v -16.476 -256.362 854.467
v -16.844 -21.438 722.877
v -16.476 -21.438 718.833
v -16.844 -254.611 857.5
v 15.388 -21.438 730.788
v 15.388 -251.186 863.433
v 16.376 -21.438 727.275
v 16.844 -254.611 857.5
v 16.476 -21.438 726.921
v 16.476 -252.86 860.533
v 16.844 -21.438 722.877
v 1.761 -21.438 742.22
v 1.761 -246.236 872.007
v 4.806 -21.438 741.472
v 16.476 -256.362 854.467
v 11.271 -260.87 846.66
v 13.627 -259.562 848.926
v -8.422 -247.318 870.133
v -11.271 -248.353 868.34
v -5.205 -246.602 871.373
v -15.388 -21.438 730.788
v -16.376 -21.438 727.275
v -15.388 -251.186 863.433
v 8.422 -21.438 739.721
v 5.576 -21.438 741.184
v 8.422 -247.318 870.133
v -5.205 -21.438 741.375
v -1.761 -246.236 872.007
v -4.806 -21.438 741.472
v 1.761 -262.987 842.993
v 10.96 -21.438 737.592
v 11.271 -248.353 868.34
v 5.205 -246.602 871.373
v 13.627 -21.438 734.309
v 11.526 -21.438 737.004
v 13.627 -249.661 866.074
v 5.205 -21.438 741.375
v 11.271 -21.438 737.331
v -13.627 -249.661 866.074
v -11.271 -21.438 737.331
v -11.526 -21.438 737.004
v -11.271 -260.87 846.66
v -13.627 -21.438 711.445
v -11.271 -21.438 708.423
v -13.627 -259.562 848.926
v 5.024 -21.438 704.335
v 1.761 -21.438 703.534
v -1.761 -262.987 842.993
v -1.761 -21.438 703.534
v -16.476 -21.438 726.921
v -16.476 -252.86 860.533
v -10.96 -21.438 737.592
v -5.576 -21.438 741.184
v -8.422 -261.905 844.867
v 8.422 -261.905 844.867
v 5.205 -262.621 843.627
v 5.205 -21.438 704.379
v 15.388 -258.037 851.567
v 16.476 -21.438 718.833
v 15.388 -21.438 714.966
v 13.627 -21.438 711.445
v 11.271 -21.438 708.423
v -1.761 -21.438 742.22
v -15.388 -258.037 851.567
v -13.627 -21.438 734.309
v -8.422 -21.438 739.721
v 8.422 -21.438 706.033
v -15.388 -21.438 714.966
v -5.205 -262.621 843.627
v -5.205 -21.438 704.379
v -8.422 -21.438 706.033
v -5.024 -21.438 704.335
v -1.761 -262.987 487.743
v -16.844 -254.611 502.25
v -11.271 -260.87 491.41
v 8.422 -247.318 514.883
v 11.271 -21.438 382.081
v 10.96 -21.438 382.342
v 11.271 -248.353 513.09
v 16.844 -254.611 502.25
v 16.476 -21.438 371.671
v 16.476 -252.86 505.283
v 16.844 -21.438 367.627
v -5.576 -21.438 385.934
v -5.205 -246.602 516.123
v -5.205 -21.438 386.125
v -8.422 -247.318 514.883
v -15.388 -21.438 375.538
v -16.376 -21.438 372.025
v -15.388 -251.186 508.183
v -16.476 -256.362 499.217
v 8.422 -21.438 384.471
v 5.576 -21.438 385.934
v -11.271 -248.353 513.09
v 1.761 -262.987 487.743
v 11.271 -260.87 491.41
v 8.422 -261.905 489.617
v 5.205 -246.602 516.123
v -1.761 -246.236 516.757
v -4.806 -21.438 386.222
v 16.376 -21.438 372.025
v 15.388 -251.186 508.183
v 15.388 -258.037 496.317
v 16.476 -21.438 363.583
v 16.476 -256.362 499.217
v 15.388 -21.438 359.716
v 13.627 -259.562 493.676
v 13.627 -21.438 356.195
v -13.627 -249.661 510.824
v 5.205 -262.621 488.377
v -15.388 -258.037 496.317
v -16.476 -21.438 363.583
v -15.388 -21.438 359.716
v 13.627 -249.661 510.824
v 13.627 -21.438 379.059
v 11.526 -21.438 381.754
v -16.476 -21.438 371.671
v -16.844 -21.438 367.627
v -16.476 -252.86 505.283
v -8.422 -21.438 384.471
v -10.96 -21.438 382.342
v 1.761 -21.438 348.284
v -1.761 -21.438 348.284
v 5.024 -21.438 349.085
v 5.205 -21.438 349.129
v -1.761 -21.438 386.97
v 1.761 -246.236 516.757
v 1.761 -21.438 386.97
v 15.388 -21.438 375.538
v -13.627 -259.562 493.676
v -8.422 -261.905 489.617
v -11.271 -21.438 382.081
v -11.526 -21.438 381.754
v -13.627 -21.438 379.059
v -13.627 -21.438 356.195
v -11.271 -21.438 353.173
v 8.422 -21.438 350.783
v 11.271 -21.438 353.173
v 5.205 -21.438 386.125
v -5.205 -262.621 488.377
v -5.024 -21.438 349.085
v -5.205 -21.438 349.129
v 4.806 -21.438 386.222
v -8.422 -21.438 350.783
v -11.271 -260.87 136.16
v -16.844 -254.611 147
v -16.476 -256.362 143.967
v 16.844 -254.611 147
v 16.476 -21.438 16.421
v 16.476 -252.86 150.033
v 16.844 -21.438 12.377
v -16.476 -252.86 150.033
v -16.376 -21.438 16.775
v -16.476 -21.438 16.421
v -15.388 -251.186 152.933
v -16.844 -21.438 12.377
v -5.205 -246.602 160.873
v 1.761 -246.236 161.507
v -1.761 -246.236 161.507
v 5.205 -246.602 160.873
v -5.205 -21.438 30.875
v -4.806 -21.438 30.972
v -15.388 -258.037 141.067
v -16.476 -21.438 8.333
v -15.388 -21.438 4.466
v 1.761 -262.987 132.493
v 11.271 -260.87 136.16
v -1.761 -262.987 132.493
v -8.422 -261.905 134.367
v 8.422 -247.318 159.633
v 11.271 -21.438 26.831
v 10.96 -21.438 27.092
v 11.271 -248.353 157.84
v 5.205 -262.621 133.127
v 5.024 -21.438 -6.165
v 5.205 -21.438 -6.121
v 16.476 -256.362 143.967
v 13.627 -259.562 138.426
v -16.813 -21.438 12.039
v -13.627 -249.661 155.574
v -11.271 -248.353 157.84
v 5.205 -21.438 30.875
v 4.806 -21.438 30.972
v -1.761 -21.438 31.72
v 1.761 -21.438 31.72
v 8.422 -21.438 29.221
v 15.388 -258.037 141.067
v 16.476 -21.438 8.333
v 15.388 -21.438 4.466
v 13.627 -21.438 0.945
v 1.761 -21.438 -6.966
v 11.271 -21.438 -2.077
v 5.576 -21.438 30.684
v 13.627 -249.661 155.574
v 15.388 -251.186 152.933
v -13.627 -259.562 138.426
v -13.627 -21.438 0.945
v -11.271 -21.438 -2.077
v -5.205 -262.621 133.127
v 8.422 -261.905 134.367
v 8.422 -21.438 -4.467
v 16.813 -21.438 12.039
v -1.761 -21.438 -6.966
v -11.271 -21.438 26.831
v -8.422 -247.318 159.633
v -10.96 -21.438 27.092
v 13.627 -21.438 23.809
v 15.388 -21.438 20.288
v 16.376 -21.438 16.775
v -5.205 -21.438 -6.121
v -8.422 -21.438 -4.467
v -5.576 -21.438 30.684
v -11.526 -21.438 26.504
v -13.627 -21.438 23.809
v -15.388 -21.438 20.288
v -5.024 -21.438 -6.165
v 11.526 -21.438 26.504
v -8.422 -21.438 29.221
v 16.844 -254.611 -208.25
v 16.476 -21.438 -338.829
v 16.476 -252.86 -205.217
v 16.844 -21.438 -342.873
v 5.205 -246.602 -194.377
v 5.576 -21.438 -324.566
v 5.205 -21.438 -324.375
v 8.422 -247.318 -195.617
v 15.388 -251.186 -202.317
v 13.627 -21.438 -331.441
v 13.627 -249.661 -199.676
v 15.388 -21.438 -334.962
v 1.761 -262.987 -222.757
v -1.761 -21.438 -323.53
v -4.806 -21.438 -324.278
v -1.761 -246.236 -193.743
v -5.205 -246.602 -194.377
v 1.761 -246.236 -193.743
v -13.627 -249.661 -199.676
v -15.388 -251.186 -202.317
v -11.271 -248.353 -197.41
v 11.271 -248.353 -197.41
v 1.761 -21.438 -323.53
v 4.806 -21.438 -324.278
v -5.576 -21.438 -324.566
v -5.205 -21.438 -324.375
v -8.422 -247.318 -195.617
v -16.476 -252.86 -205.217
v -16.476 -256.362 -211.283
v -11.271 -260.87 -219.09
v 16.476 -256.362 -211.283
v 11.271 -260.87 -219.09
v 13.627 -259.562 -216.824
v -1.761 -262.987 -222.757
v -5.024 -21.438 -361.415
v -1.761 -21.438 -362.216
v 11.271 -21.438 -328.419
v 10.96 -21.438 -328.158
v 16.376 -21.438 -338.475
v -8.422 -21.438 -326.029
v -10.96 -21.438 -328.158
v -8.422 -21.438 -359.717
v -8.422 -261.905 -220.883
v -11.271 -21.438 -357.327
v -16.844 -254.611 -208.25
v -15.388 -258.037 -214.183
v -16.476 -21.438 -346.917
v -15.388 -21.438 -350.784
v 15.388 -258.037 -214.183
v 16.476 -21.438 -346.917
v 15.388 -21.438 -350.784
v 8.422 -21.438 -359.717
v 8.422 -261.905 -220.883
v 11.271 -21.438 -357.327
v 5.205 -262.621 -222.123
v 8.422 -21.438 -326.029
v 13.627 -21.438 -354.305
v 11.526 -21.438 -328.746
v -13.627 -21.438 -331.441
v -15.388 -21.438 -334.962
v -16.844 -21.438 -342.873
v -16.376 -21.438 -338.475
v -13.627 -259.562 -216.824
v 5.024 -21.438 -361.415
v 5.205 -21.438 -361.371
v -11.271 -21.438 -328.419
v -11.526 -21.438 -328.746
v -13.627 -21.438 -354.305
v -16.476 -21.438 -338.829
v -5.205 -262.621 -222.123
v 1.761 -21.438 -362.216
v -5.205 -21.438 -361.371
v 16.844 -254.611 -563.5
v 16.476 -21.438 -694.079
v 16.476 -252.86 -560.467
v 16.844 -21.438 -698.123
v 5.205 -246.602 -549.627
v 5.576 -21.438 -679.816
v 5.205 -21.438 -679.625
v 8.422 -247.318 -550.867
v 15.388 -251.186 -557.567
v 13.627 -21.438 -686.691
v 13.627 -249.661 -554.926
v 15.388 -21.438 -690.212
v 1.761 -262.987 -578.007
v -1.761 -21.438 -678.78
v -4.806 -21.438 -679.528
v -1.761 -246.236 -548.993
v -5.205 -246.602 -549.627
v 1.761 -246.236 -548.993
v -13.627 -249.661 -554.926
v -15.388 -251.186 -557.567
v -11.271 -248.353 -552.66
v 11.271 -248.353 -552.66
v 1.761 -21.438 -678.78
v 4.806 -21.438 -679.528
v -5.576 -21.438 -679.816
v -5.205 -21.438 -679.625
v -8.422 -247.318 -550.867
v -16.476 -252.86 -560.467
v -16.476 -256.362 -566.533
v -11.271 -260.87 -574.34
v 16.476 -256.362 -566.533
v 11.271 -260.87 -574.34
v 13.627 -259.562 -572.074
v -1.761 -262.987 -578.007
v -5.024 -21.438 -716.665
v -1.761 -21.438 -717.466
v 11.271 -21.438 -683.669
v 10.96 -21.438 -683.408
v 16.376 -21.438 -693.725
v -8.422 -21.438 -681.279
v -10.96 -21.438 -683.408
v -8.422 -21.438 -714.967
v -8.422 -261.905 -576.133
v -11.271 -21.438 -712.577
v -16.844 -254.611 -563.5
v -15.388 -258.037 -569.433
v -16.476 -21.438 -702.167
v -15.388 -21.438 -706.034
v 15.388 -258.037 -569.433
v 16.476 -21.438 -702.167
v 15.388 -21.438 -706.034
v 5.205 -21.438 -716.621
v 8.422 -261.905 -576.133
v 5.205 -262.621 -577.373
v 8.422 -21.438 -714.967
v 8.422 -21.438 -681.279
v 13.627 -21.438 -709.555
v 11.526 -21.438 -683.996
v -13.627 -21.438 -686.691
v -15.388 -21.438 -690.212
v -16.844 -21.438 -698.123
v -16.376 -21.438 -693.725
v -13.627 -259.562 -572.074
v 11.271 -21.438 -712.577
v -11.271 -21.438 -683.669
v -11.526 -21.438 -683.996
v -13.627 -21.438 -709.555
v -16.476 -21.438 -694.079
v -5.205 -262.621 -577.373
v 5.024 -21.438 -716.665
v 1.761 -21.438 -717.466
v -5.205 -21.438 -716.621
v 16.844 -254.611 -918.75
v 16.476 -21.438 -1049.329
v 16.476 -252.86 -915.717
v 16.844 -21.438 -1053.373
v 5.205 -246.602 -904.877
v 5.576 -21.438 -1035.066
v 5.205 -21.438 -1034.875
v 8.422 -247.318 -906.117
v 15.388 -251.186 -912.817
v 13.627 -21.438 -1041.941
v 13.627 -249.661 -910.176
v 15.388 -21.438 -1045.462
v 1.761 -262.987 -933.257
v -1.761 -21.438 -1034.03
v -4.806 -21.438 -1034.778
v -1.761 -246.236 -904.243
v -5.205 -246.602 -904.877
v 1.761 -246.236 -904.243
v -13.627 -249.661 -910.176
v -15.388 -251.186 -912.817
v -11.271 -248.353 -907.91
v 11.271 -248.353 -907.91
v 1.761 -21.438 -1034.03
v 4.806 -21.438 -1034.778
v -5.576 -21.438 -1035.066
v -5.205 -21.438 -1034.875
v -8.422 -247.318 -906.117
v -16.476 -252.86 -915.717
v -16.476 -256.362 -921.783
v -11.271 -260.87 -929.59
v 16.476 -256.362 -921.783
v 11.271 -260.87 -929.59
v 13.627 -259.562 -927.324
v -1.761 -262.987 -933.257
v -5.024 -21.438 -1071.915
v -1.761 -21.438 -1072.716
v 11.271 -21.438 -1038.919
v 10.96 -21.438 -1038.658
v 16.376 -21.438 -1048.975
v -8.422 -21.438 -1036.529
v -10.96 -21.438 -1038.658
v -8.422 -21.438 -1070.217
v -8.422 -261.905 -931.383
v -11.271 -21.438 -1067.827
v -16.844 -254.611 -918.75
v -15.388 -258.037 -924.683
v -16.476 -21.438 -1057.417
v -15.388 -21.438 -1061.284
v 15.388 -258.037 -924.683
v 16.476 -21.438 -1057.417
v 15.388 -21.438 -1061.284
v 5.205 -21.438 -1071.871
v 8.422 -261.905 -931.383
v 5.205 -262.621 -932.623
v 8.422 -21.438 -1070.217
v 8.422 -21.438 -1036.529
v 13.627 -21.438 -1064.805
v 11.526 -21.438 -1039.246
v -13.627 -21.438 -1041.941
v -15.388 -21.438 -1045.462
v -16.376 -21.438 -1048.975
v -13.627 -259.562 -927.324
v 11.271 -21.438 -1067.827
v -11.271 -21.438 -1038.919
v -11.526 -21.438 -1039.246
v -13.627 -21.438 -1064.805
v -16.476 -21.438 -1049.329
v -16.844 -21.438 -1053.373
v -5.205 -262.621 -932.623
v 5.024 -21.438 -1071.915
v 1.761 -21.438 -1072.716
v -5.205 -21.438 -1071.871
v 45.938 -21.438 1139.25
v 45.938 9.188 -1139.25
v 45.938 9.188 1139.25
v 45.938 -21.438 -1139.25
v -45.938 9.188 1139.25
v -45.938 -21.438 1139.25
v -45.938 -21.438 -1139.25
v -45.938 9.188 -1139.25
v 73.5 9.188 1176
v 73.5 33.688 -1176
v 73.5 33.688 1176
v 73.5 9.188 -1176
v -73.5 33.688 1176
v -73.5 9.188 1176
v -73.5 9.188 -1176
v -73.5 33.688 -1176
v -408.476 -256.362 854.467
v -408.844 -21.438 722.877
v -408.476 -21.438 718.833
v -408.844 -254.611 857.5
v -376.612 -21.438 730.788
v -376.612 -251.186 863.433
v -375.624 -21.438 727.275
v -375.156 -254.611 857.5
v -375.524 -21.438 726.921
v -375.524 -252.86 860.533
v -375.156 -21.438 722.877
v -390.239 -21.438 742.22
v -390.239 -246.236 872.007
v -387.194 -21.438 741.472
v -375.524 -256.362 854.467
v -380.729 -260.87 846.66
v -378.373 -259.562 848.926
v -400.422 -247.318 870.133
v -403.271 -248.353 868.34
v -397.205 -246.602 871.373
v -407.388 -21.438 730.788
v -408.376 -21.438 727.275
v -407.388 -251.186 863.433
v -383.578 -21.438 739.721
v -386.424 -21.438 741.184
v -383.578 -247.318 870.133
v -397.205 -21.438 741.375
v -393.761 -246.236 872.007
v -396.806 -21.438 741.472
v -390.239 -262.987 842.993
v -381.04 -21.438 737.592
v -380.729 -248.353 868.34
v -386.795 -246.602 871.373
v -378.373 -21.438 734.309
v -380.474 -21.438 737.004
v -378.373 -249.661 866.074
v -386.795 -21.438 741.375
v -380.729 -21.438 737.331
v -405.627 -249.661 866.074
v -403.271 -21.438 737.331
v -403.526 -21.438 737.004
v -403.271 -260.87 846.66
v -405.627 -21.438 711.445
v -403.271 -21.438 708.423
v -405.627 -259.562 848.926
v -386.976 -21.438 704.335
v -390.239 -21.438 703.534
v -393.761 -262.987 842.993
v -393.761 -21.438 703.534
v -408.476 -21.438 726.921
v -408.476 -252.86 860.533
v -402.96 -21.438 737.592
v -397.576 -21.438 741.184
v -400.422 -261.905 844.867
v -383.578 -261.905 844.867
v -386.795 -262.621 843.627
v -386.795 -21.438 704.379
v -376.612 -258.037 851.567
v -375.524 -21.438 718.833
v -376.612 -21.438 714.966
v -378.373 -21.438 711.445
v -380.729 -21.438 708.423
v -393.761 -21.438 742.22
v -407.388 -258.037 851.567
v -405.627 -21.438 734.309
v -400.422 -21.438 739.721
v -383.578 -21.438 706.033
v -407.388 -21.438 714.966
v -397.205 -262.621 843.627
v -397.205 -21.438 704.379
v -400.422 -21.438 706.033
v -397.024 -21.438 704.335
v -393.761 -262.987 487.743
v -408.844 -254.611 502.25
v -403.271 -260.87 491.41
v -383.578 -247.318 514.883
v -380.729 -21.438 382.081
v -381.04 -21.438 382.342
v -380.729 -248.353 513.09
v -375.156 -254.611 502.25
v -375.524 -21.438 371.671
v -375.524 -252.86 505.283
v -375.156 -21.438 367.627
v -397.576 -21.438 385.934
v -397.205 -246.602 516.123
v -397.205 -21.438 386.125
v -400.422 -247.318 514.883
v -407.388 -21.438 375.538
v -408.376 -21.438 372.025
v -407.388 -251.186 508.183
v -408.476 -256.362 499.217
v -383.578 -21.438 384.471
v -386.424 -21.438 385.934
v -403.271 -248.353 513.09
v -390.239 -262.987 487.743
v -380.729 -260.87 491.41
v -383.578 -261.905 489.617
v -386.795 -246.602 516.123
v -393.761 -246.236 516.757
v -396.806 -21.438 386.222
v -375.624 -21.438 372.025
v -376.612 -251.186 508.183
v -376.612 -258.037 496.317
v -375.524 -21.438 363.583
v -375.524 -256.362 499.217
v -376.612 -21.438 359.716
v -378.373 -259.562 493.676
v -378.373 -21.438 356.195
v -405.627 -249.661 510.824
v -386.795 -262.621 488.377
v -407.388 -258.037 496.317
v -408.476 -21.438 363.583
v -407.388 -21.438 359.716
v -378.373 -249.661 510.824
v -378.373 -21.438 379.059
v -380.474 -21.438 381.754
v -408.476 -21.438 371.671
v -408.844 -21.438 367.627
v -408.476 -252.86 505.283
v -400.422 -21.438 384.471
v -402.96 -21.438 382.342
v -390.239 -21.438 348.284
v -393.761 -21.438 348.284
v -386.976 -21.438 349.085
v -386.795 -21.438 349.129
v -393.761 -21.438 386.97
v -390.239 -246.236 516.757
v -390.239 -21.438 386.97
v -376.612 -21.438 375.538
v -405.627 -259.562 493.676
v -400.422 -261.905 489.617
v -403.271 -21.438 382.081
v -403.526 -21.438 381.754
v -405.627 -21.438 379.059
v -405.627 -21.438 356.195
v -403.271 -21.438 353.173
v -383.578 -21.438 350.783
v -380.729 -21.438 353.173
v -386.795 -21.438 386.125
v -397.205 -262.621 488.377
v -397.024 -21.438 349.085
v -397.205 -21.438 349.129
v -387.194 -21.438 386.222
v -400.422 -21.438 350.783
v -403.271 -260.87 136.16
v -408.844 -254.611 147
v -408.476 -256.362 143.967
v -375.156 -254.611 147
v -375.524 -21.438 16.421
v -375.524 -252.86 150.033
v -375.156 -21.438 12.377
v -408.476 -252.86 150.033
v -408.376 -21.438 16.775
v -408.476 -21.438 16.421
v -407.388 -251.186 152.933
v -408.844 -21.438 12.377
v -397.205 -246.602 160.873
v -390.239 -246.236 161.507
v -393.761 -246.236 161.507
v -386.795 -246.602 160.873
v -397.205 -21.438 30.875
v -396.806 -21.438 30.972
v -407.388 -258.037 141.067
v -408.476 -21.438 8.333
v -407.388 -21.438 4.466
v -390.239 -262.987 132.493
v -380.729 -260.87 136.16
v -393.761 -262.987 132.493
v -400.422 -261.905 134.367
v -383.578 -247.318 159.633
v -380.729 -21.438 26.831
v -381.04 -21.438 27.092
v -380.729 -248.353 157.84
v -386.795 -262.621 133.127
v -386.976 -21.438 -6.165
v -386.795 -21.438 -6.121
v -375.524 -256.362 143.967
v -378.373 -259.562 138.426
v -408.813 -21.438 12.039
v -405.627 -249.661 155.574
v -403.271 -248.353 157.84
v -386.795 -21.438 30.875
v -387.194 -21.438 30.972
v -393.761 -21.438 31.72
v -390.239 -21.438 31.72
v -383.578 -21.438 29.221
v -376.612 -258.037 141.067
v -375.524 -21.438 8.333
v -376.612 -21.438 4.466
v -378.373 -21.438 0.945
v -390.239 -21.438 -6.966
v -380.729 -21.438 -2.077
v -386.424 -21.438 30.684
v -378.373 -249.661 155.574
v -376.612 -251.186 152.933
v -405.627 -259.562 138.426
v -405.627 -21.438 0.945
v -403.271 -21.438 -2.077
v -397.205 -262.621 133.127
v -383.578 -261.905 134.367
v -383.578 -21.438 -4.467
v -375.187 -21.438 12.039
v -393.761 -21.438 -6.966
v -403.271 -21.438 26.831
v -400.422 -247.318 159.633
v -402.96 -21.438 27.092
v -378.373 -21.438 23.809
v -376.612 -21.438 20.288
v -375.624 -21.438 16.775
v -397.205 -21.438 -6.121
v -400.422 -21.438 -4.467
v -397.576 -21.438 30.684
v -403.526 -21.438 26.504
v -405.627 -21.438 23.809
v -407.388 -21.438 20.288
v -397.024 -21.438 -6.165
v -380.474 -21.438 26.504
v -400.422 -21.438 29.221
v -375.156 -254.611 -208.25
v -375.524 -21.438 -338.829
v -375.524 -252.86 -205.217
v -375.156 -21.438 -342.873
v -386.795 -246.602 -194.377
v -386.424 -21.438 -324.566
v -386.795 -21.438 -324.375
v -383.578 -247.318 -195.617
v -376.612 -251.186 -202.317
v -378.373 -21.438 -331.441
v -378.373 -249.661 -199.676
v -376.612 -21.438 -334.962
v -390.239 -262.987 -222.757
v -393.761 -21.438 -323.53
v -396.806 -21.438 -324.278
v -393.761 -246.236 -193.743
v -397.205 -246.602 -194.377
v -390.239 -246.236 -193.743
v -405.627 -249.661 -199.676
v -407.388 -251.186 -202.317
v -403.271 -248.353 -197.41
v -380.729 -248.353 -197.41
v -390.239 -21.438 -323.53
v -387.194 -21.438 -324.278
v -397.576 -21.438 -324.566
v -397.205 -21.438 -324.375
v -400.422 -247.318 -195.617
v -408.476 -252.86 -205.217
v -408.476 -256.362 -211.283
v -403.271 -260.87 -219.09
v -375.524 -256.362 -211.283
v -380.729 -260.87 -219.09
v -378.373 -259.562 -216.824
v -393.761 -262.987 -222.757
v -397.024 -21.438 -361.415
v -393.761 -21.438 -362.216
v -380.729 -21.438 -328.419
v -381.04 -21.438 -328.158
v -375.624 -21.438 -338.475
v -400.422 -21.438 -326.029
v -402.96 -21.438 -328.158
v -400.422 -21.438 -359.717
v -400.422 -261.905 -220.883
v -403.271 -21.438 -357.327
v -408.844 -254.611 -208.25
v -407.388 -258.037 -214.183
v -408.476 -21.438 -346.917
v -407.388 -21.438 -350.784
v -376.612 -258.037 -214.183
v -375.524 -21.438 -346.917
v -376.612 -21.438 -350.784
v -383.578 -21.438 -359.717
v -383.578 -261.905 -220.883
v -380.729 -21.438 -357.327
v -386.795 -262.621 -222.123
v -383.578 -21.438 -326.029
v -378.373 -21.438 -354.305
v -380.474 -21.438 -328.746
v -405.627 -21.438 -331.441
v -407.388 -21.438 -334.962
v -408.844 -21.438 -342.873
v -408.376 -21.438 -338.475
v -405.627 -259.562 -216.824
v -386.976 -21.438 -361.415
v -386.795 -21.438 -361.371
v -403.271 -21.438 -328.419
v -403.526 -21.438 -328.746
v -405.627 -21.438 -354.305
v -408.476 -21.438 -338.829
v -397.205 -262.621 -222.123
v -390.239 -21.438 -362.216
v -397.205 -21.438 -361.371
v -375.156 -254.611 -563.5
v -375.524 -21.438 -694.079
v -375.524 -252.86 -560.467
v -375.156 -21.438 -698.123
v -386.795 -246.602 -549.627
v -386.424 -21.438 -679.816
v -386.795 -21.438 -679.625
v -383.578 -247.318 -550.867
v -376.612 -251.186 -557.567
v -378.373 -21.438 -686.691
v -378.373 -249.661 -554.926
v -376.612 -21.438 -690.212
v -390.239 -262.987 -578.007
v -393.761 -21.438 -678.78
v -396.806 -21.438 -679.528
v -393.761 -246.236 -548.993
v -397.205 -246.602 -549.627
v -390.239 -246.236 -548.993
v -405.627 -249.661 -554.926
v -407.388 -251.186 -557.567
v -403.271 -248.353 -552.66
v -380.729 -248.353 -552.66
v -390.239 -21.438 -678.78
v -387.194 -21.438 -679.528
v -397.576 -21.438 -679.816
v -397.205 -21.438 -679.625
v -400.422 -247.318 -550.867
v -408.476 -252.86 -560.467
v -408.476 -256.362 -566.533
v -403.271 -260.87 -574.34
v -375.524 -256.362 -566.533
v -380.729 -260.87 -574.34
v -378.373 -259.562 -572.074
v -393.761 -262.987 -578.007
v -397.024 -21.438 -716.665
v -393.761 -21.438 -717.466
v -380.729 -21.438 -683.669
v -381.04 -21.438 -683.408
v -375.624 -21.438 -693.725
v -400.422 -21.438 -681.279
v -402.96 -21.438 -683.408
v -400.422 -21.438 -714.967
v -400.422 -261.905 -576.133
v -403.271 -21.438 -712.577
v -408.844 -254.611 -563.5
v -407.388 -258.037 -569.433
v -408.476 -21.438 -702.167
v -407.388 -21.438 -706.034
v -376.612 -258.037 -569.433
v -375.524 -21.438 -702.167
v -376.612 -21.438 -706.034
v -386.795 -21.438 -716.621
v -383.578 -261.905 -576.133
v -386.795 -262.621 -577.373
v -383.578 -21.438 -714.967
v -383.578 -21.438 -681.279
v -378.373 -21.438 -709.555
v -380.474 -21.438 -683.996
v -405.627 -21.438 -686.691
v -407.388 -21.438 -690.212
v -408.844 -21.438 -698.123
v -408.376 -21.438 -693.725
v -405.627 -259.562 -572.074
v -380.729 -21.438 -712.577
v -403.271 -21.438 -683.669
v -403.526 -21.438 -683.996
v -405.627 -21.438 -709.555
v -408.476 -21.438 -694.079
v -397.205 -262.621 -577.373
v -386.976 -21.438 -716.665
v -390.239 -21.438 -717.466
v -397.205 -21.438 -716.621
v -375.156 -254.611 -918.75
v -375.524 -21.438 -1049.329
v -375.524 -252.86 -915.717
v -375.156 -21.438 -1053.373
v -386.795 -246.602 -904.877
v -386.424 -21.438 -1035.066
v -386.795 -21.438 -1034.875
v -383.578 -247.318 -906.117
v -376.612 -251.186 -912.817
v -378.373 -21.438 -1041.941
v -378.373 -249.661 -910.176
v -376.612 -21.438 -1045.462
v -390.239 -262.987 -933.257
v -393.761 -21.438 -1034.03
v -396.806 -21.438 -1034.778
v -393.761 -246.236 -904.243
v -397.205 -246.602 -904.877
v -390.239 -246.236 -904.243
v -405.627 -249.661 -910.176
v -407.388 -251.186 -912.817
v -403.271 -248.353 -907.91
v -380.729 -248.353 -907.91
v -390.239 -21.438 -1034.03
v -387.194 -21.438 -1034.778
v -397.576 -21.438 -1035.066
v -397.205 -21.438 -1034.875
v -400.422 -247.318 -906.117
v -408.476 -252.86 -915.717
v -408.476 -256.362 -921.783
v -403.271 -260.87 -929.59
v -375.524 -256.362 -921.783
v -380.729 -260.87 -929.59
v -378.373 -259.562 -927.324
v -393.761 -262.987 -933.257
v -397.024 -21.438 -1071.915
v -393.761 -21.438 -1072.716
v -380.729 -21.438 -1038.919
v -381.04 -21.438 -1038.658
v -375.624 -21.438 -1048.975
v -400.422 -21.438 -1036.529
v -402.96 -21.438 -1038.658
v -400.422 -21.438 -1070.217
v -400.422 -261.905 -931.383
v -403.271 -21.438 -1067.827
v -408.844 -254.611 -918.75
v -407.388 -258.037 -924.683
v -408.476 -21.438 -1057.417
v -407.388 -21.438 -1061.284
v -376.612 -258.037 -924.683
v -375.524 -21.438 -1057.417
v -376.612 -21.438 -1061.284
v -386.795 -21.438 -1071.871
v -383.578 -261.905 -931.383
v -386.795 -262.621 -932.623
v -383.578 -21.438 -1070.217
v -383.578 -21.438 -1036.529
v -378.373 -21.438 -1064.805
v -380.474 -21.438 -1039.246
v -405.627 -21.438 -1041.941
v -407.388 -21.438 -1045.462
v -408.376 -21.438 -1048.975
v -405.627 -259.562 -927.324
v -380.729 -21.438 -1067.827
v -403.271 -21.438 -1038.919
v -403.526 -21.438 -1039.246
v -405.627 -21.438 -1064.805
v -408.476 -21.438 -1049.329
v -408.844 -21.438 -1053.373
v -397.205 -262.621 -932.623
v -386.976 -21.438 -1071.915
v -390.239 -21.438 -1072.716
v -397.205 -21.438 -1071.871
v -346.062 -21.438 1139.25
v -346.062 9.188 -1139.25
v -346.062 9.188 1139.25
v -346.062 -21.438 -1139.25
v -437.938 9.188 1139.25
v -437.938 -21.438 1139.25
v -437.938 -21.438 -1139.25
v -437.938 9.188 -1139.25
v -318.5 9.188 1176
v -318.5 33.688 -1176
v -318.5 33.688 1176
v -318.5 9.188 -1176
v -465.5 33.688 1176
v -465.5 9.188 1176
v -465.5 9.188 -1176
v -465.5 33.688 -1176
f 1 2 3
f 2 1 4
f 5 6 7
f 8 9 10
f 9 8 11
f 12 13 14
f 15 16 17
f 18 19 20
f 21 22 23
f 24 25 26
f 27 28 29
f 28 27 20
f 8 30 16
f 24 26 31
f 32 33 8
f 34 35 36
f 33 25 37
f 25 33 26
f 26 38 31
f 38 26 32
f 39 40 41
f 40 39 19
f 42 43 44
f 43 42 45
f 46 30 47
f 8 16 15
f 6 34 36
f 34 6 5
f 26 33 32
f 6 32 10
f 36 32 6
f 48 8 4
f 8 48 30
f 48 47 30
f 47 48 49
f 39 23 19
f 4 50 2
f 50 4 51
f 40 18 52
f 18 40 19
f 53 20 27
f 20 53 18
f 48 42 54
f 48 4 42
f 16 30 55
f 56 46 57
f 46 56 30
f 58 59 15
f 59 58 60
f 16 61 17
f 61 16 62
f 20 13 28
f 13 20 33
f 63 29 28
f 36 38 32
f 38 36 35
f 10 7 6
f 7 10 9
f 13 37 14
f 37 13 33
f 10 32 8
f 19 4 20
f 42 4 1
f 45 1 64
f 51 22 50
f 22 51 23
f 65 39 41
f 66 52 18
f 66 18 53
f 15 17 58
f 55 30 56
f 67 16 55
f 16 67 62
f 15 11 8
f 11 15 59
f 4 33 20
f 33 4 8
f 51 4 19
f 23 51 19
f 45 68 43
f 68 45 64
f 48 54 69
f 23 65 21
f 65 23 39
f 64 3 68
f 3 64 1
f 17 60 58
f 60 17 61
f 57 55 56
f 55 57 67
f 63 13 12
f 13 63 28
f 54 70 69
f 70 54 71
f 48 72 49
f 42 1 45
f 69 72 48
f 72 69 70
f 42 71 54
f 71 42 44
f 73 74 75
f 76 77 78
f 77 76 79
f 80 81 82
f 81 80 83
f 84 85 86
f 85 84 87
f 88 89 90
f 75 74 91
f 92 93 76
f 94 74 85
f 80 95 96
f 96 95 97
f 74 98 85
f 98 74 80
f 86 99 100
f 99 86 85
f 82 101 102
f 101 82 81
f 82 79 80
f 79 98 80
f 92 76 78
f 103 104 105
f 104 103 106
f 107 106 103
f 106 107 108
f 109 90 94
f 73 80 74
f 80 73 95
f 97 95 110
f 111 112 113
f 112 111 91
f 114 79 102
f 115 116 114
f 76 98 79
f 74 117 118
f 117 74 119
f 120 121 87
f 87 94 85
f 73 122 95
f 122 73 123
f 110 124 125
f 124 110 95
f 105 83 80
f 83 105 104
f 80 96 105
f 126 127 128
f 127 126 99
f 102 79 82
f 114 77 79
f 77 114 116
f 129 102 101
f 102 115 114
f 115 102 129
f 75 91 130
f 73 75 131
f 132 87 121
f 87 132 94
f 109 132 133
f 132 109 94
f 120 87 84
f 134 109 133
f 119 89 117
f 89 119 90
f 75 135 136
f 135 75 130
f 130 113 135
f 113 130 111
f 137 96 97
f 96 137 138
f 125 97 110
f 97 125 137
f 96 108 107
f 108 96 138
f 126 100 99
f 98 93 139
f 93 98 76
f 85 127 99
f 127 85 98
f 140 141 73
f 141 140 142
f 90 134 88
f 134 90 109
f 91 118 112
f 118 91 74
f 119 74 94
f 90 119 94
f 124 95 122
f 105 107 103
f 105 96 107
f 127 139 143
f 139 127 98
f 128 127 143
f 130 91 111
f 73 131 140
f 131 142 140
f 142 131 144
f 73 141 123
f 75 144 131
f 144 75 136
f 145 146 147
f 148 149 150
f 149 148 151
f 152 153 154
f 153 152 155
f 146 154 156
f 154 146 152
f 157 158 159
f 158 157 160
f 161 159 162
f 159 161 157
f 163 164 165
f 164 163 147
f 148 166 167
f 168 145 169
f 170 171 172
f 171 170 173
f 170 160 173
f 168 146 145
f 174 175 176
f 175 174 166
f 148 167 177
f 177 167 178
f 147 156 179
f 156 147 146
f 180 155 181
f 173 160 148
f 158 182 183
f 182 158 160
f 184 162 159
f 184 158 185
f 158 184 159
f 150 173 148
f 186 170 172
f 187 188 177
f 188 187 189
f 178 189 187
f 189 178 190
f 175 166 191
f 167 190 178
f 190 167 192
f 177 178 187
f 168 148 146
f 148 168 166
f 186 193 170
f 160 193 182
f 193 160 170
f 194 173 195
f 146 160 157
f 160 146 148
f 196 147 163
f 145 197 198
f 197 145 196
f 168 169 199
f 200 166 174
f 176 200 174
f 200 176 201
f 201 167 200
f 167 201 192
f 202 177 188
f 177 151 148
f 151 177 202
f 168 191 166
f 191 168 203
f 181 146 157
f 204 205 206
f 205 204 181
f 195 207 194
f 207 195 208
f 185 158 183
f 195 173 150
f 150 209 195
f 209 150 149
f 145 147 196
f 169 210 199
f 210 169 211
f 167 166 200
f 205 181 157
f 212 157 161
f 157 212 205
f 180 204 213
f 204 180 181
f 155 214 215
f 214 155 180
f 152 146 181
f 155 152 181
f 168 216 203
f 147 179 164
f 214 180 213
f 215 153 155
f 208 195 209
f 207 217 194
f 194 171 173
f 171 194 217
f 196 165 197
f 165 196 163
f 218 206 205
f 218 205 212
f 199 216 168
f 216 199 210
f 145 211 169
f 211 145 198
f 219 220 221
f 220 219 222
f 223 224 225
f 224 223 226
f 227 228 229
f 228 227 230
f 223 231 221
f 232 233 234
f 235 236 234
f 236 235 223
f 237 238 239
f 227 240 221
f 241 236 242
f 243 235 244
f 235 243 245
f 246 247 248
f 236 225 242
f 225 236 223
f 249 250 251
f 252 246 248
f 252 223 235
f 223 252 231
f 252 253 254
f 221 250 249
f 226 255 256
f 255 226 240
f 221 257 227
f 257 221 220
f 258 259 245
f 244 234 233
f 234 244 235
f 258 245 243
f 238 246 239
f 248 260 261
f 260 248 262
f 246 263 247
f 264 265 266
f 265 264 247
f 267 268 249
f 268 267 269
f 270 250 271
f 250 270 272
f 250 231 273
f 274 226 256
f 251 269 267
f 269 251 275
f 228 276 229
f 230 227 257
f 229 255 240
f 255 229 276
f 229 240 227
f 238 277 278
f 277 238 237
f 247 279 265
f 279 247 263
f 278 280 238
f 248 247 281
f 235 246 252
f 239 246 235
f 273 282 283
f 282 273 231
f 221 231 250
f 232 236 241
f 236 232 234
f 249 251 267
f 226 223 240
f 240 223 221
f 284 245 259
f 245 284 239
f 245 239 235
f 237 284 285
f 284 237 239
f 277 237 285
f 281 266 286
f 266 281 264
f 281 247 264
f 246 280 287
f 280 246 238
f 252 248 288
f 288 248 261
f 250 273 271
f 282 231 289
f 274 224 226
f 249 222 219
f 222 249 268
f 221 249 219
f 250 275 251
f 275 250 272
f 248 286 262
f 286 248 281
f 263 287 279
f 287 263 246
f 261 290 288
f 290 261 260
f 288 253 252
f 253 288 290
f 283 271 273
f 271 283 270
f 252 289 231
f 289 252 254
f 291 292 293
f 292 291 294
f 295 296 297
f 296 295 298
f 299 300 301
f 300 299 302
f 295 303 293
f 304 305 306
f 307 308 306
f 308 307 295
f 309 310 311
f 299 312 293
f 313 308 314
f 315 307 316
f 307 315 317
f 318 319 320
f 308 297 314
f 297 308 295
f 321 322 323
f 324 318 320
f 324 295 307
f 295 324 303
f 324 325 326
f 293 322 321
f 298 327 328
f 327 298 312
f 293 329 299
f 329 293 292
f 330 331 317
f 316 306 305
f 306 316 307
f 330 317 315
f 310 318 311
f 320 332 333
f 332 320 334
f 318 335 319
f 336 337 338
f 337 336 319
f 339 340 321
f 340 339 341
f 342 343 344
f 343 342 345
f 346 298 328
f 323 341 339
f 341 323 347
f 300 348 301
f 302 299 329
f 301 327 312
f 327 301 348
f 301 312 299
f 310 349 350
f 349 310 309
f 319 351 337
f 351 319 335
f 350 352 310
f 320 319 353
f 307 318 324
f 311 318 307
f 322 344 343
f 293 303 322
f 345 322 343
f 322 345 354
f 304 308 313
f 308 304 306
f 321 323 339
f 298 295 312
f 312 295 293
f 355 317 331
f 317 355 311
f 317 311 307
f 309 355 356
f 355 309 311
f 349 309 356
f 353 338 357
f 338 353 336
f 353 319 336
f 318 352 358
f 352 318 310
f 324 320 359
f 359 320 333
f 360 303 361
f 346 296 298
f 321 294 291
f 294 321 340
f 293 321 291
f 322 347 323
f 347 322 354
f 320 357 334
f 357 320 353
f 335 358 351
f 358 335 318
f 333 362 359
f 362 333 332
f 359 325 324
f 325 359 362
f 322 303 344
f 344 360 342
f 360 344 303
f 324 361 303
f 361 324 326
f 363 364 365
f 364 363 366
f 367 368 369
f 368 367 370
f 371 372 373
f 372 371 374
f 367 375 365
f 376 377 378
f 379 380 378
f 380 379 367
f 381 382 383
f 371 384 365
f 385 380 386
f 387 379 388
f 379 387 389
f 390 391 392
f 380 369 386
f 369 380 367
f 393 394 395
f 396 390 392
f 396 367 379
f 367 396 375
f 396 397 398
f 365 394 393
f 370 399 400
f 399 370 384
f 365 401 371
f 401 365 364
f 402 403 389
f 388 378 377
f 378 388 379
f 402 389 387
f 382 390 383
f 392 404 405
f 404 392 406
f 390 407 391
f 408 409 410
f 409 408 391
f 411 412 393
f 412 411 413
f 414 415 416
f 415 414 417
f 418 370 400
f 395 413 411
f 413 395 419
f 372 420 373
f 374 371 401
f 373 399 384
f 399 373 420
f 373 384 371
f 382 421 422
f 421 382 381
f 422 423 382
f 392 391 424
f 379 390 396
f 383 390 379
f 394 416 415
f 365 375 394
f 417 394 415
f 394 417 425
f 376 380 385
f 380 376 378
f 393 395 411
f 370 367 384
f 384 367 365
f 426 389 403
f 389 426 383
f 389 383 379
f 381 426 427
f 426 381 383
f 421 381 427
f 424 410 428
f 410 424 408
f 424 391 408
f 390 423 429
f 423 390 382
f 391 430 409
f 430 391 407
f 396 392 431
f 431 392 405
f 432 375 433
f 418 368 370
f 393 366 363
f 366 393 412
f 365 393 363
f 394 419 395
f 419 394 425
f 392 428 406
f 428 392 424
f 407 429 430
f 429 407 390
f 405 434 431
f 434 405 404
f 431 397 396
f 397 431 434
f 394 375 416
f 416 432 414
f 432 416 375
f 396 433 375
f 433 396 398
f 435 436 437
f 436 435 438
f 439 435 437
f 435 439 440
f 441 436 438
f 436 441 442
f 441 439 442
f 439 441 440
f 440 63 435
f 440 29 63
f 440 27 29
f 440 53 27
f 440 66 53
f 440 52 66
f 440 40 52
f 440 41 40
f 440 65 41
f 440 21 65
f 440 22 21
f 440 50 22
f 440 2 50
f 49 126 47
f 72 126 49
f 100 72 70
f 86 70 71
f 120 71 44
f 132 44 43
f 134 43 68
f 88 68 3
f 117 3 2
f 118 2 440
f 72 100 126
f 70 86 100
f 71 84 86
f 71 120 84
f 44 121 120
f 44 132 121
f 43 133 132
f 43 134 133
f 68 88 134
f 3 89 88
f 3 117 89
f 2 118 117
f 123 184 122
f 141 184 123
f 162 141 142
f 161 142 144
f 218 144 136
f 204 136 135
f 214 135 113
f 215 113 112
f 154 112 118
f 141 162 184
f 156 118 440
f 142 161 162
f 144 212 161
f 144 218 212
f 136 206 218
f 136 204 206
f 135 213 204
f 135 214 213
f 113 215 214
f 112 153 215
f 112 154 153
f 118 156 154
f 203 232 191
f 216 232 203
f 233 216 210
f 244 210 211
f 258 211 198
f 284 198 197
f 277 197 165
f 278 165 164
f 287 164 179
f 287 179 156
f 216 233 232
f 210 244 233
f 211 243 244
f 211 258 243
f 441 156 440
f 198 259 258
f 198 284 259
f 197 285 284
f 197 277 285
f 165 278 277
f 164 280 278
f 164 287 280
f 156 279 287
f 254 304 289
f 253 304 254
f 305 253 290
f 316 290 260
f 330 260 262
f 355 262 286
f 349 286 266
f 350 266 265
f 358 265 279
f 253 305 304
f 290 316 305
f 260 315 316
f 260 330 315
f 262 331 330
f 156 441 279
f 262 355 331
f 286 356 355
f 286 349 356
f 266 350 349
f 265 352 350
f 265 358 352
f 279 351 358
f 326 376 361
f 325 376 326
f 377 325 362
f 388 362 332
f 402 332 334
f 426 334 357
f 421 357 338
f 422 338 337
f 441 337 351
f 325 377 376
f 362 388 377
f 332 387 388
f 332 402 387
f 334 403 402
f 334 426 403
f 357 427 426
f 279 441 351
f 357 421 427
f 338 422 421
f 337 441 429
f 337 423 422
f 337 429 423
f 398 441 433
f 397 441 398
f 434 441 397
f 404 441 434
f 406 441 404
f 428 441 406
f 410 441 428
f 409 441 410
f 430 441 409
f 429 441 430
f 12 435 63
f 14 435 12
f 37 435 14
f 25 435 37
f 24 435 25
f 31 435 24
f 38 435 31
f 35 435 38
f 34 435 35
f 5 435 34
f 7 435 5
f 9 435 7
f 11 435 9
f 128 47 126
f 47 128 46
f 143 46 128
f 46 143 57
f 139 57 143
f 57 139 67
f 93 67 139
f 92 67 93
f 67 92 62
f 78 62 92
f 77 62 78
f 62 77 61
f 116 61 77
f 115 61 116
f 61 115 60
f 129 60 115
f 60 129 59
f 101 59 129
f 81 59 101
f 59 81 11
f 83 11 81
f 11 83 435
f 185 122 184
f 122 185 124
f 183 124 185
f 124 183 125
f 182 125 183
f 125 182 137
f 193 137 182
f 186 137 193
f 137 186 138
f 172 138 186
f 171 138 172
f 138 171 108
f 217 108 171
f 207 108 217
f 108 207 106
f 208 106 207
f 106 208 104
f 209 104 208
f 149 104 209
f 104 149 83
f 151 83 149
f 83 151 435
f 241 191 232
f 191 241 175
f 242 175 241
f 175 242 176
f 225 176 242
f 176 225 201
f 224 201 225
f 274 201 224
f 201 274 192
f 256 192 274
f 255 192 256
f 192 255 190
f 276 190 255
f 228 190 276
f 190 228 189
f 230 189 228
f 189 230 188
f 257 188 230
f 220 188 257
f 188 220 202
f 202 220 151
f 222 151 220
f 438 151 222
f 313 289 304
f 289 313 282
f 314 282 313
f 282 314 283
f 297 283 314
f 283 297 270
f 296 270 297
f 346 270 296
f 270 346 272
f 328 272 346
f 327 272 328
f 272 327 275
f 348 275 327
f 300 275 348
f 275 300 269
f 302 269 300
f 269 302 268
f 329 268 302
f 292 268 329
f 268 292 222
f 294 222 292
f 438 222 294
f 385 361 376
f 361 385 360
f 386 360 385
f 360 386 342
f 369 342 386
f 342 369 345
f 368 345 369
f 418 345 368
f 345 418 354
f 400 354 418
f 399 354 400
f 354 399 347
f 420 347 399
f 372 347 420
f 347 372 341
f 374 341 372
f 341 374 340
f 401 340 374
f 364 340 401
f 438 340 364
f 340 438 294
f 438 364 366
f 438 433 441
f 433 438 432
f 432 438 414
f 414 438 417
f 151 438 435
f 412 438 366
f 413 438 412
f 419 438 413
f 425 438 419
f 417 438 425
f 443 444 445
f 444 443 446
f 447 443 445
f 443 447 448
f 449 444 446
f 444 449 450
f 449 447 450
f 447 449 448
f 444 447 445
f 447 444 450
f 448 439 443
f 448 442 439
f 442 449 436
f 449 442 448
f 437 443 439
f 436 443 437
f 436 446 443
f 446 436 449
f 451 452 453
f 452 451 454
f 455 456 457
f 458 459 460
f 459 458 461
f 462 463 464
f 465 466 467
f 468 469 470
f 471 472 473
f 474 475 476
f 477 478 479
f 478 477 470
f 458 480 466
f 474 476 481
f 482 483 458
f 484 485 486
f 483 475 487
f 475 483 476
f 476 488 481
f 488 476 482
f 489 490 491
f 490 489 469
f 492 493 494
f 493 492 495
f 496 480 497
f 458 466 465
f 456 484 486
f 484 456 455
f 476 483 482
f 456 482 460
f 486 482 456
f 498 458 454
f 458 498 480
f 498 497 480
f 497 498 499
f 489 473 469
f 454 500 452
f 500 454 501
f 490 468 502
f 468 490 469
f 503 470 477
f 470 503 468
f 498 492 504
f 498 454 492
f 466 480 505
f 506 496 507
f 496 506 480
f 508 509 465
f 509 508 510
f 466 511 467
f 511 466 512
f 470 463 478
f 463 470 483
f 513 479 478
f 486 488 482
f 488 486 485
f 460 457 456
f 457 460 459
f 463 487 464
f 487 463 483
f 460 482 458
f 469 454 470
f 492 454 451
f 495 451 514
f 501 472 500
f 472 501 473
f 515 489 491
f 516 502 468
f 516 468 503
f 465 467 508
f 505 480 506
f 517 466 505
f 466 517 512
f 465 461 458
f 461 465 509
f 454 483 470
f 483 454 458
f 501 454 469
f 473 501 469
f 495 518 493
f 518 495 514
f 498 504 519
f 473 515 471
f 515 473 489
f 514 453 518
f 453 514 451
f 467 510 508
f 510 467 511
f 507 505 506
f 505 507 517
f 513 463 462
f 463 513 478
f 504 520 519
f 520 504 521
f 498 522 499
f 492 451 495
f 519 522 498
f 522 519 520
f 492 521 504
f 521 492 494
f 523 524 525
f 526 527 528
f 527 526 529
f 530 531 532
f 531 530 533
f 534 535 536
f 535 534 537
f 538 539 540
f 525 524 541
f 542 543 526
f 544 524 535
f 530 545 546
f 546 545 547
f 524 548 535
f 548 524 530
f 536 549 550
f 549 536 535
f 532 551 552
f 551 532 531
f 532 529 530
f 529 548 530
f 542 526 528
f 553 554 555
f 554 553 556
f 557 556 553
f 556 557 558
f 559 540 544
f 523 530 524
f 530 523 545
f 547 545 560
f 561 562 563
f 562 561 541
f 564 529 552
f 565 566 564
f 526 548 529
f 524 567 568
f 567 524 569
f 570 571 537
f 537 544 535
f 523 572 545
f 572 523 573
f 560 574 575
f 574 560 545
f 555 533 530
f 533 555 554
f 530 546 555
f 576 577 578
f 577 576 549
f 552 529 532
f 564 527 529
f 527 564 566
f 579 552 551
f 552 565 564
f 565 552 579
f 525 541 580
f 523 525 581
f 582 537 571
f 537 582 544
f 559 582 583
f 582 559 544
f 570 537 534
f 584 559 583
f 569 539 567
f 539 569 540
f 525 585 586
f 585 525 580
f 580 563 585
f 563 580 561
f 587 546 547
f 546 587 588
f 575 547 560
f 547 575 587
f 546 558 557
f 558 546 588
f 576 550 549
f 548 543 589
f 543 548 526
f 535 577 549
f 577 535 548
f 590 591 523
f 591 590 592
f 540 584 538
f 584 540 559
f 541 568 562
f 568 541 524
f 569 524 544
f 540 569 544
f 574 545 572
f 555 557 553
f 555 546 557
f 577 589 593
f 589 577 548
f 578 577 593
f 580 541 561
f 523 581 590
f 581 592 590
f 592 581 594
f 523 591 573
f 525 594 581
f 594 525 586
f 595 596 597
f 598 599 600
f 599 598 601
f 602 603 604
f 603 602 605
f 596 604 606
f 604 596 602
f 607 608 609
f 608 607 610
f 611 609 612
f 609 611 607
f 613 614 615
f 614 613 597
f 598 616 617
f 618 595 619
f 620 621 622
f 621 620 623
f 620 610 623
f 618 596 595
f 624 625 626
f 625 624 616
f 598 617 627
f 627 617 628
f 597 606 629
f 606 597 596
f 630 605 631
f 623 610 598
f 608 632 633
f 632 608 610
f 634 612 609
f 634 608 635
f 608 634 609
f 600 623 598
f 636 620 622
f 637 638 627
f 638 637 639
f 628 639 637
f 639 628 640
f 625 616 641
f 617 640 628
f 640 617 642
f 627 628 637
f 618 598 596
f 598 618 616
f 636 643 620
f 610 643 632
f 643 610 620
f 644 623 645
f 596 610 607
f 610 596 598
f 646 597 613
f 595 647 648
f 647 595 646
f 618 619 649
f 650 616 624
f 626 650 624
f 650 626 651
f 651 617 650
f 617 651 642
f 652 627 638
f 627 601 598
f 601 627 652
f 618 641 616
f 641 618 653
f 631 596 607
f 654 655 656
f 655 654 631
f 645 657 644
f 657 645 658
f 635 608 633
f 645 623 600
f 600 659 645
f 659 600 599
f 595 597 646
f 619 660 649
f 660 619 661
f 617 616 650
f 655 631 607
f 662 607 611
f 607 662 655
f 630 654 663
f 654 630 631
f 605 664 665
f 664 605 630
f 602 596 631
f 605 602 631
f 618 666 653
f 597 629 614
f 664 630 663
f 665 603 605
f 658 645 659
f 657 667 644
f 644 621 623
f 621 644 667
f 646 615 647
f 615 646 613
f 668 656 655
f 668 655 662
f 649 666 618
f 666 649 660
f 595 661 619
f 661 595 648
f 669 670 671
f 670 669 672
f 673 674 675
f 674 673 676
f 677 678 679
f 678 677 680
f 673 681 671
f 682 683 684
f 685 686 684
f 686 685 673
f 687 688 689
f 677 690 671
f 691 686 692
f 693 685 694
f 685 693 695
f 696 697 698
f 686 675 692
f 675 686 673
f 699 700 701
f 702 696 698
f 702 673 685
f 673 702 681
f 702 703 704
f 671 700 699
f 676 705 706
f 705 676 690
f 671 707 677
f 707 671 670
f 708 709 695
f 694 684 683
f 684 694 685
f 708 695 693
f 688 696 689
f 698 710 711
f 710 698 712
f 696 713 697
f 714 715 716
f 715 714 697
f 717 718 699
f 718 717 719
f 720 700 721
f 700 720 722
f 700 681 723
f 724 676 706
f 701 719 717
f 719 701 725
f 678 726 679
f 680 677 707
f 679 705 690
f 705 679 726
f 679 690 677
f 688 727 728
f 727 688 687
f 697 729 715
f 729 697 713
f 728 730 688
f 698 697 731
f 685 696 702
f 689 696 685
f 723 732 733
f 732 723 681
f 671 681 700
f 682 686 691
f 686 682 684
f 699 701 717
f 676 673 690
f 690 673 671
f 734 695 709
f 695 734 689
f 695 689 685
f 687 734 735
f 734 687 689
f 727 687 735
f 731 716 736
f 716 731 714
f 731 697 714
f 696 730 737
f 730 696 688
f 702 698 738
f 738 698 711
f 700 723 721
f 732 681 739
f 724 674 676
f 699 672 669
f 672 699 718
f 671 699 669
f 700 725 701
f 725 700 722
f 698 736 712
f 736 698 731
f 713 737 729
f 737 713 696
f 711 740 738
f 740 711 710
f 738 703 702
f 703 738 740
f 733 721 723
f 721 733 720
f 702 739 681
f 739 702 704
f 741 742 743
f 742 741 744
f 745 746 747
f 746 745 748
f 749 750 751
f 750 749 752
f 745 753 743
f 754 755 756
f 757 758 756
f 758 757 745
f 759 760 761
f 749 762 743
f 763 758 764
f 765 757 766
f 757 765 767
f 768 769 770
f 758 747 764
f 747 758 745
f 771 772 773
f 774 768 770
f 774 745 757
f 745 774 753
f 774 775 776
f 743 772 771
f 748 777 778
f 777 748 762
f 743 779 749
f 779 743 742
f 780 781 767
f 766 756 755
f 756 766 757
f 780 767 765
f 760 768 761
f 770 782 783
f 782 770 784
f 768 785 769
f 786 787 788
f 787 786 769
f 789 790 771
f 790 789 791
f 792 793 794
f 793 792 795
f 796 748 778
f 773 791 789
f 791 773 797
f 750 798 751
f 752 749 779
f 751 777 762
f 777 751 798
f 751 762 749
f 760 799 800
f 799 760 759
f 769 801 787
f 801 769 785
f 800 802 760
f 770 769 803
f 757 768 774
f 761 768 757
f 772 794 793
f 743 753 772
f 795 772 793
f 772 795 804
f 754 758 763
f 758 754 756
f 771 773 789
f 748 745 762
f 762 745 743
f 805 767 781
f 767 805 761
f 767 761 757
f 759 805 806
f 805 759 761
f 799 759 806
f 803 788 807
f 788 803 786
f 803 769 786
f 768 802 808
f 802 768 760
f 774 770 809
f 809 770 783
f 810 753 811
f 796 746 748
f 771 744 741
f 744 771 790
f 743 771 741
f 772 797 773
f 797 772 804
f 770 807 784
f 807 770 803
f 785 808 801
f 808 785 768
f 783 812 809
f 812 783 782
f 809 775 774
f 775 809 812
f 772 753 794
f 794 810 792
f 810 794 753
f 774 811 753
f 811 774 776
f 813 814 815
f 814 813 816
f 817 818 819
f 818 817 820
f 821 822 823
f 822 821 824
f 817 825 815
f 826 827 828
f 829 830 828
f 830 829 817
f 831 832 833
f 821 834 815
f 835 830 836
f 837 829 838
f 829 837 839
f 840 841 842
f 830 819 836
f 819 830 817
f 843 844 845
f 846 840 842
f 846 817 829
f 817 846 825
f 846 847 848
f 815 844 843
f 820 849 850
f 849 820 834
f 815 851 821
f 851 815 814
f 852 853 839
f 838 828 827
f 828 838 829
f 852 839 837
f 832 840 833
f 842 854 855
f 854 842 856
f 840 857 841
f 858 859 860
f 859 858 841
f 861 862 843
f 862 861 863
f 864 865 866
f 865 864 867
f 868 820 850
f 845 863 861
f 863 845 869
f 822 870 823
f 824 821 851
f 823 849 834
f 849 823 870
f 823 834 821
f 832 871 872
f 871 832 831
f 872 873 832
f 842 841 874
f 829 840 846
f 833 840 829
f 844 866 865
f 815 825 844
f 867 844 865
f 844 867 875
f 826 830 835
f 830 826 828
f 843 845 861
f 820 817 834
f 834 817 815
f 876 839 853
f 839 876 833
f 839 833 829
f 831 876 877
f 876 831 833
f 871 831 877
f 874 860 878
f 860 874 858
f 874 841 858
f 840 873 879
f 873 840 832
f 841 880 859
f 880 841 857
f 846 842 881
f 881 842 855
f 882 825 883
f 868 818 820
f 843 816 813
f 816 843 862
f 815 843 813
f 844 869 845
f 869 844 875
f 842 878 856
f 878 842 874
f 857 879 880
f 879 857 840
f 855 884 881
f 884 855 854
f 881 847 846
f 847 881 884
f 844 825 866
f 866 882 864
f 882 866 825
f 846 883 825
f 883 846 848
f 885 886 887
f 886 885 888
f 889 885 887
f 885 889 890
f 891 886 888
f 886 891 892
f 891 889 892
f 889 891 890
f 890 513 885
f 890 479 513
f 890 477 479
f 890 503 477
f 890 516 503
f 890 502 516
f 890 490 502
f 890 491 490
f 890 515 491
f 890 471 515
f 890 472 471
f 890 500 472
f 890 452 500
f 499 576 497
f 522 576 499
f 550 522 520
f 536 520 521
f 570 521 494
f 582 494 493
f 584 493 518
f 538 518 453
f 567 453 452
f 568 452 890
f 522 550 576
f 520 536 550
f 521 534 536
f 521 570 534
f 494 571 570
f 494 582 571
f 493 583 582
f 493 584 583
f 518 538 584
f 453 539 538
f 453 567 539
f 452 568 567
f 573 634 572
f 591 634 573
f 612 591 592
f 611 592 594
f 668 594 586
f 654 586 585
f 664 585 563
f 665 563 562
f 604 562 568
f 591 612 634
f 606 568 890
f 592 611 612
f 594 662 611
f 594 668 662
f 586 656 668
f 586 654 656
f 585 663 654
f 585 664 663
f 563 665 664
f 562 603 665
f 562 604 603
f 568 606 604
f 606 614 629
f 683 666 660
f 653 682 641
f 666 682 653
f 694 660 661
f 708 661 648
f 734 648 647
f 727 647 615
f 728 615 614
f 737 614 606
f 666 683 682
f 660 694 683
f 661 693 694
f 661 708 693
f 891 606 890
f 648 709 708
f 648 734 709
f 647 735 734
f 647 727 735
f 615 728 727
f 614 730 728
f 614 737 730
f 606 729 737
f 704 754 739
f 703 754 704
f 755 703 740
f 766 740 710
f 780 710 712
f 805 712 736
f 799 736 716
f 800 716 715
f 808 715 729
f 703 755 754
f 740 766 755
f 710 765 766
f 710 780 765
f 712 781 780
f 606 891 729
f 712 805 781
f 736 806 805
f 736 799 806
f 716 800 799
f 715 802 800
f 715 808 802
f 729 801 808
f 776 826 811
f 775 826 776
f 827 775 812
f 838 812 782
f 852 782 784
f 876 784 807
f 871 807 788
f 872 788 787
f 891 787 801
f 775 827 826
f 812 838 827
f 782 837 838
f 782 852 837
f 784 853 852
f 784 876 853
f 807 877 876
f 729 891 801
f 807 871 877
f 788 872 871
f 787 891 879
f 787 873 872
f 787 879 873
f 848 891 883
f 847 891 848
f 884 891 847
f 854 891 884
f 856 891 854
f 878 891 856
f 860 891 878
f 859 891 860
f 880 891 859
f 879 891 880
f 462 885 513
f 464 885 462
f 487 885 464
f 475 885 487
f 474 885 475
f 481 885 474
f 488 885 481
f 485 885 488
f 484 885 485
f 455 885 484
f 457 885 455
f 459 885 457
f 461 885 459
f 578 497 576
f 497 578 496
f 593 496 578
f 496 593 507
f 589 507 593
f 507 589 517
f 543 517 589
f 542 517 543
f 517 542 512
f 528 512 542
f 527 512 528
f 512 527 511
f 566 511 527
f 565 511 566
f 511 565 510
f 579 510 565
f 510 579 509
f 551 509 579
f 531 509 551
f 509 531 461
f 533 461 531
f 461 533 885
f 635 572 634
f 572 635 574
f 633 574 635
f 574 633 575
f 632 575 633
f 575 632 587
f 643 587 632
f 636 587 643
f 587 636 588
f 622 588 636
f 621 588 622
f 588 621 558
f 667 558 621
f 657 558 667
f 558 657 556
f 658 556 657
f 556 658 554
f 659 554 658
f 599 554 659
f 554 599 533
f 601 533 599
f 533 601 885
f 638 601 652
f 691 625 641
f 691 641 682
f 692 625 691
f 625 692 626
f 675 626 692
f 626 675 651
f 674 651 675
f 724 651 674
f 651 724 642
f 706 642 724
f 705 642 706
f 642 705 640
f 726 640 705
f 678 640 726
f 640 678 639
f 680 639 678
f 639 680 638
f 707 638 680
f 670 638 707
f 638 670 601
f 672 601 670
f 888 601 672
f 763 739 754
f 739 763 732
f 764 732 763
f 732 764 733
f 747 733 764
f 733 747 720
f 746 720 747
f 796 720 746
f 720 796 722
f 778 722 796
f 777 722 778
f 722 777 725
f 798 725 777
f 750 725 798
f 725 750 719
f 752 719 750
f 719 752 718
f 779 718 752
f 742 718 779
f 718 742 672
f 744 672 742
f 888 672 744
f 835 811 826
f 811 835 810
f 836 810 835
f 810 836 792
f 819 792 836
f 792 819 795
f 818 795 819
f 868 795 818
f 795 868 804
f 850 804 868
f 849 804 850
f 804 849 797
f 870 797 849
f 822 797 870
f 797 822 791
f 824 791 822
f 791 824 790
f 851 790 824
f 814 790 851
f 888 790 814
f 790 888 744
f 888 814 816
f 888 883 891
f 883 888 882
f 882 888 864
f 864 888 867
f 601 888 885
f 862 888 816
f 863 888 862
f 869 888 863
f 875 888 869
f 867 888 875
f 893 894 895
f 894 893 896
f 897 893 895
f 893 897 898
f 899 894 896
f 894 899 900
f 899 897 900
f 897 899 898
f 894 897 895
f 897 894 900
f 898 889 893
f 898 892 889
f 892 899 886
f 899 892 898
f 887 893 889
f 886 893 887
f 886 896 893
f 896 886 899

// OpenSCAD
/*
############## GROCERY LIST ##############
2x 1-3/8 poplar dowel
2x 8' 2x4
2x 8' 1x6x8

1x 1-3/8 wing drill bit
screws (1-3/4)
*/

shaft_d=1+3/8;
shaft_l=1*12;
angle=30;
shafts=6;

bottom_plank_w=6;
bottom_plank_t=1;
bottom_plank_h=8*12;

top_plank_w=3+3/4;
top_plank_t=1+3/4;
top_plank_h=(bottom_plank_h-(0.25*12));

rack_spacing = 16;

metric_conversion=24.5;

module shaft() {
	iter=(top_plank_h*metric_conversion-((0.5*12)*metric_conversion))/shafts;
echo(iter);
	for(i=[-shafts/2+1:shafts/2]) {
		translate([0,0,-i*iter]) rotate([90-angle,0,0]) 
			cylinder(r1=shaft_d/2*metric_conversion,r2=shaft_d/2*metric_conversion,shaft_l*metric_conversion);
	}
}

module rack_half() {
	cube([top_plank_w*metric_conversion,top_plank_t*metric_conversion,top_plank_h*metric_conversion],center=true);
	translate([0,top_plank_t/2*metric_conversion,0]) 
		cube([bottom_plank_w*metric_conversion,bottom_plank_t*metric_conversion,bottom_plank_h*metric_conversion],center=true);
	shaft();
}

module rack() {
	rack_half();
	translate([-rack_spacing*metric_conversion,0,0]) rack_half();
}

rack();
